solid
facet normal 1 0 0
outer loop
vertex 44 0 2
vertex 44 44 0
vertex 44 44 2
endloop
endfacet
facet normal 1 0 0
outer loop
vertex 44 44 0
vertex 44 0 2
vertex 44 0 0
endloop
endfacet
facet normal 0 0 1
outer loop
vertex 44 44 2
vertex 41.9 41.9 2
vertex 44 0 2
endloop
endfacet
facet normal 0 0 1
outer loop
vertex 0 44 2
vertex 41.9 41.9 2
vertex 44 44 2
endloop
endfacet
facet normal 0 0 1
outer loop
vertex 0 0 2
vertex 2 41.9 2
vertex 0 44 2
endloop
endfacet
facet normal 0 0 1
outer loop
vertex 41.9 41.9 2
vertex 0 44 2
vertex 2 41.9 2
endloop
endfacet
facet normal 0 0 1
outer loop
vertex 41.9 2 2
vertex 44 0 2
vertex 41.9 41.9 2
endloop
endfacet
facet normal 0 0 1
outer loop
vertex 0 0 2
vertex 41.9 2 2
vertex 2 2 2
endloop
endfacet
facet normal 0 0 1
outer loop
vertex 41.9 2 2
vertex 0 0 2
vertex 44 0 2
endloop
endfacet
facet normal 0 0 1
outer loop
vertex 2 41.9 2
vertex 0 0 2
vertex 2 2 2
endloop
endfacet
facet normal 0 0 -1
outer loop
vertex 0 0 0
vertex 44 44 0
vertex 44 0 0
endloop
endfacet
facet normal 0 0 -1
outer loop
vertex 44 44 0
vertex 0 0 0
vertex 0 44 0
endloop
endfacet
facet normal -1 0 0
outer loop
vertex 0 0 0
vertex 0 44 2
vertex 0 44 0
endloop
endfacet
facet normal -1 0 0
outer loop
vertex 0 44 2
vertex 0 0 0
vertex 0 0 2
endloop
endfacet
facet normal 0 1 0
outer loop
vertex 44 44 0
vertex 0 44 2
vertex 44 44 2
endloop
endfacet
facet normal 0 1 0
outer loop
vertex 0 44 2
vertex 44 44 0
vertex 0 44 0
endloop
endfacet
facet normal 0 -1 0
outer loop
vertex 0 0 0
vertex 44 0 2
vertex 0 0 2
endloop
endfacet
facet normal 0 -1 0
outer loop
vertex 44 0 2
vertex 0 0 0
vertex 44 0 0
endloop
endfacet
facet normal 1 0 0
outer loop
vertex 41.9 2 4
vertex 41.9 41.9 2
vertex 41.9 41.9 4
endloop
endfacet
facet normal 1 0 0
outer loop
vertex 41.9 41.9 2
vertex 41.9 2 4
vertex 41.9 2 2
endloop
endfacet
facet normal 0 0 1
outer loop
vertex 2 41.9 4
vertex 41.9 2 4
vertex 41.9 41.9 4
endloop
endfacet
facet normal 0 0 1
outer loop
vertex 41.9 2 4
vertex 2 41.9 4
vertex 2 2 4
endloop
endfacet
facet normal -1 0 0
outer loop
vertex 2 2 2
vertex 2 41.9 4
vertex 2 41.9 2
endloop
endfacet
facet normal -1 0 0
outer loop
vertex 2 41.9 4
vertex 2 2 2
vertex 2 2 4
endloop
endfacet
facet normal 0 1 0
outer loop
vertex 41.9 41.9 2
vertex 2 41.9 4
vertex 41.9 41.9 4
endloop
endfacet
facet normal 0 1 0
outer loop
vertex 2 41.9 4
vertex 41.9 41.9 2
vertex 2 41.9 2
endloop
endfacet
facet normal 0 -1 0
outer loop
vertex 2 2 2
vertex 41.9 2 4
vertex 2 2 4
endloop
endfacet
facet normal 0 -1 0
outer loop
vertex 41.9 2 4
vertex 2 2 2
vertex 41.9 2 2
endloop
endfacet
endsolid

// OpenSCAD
$fn=100;

 cube([44,44,2]);
 translate([2,2,2]){
 cube([39.9,39.9,2]);
 }
